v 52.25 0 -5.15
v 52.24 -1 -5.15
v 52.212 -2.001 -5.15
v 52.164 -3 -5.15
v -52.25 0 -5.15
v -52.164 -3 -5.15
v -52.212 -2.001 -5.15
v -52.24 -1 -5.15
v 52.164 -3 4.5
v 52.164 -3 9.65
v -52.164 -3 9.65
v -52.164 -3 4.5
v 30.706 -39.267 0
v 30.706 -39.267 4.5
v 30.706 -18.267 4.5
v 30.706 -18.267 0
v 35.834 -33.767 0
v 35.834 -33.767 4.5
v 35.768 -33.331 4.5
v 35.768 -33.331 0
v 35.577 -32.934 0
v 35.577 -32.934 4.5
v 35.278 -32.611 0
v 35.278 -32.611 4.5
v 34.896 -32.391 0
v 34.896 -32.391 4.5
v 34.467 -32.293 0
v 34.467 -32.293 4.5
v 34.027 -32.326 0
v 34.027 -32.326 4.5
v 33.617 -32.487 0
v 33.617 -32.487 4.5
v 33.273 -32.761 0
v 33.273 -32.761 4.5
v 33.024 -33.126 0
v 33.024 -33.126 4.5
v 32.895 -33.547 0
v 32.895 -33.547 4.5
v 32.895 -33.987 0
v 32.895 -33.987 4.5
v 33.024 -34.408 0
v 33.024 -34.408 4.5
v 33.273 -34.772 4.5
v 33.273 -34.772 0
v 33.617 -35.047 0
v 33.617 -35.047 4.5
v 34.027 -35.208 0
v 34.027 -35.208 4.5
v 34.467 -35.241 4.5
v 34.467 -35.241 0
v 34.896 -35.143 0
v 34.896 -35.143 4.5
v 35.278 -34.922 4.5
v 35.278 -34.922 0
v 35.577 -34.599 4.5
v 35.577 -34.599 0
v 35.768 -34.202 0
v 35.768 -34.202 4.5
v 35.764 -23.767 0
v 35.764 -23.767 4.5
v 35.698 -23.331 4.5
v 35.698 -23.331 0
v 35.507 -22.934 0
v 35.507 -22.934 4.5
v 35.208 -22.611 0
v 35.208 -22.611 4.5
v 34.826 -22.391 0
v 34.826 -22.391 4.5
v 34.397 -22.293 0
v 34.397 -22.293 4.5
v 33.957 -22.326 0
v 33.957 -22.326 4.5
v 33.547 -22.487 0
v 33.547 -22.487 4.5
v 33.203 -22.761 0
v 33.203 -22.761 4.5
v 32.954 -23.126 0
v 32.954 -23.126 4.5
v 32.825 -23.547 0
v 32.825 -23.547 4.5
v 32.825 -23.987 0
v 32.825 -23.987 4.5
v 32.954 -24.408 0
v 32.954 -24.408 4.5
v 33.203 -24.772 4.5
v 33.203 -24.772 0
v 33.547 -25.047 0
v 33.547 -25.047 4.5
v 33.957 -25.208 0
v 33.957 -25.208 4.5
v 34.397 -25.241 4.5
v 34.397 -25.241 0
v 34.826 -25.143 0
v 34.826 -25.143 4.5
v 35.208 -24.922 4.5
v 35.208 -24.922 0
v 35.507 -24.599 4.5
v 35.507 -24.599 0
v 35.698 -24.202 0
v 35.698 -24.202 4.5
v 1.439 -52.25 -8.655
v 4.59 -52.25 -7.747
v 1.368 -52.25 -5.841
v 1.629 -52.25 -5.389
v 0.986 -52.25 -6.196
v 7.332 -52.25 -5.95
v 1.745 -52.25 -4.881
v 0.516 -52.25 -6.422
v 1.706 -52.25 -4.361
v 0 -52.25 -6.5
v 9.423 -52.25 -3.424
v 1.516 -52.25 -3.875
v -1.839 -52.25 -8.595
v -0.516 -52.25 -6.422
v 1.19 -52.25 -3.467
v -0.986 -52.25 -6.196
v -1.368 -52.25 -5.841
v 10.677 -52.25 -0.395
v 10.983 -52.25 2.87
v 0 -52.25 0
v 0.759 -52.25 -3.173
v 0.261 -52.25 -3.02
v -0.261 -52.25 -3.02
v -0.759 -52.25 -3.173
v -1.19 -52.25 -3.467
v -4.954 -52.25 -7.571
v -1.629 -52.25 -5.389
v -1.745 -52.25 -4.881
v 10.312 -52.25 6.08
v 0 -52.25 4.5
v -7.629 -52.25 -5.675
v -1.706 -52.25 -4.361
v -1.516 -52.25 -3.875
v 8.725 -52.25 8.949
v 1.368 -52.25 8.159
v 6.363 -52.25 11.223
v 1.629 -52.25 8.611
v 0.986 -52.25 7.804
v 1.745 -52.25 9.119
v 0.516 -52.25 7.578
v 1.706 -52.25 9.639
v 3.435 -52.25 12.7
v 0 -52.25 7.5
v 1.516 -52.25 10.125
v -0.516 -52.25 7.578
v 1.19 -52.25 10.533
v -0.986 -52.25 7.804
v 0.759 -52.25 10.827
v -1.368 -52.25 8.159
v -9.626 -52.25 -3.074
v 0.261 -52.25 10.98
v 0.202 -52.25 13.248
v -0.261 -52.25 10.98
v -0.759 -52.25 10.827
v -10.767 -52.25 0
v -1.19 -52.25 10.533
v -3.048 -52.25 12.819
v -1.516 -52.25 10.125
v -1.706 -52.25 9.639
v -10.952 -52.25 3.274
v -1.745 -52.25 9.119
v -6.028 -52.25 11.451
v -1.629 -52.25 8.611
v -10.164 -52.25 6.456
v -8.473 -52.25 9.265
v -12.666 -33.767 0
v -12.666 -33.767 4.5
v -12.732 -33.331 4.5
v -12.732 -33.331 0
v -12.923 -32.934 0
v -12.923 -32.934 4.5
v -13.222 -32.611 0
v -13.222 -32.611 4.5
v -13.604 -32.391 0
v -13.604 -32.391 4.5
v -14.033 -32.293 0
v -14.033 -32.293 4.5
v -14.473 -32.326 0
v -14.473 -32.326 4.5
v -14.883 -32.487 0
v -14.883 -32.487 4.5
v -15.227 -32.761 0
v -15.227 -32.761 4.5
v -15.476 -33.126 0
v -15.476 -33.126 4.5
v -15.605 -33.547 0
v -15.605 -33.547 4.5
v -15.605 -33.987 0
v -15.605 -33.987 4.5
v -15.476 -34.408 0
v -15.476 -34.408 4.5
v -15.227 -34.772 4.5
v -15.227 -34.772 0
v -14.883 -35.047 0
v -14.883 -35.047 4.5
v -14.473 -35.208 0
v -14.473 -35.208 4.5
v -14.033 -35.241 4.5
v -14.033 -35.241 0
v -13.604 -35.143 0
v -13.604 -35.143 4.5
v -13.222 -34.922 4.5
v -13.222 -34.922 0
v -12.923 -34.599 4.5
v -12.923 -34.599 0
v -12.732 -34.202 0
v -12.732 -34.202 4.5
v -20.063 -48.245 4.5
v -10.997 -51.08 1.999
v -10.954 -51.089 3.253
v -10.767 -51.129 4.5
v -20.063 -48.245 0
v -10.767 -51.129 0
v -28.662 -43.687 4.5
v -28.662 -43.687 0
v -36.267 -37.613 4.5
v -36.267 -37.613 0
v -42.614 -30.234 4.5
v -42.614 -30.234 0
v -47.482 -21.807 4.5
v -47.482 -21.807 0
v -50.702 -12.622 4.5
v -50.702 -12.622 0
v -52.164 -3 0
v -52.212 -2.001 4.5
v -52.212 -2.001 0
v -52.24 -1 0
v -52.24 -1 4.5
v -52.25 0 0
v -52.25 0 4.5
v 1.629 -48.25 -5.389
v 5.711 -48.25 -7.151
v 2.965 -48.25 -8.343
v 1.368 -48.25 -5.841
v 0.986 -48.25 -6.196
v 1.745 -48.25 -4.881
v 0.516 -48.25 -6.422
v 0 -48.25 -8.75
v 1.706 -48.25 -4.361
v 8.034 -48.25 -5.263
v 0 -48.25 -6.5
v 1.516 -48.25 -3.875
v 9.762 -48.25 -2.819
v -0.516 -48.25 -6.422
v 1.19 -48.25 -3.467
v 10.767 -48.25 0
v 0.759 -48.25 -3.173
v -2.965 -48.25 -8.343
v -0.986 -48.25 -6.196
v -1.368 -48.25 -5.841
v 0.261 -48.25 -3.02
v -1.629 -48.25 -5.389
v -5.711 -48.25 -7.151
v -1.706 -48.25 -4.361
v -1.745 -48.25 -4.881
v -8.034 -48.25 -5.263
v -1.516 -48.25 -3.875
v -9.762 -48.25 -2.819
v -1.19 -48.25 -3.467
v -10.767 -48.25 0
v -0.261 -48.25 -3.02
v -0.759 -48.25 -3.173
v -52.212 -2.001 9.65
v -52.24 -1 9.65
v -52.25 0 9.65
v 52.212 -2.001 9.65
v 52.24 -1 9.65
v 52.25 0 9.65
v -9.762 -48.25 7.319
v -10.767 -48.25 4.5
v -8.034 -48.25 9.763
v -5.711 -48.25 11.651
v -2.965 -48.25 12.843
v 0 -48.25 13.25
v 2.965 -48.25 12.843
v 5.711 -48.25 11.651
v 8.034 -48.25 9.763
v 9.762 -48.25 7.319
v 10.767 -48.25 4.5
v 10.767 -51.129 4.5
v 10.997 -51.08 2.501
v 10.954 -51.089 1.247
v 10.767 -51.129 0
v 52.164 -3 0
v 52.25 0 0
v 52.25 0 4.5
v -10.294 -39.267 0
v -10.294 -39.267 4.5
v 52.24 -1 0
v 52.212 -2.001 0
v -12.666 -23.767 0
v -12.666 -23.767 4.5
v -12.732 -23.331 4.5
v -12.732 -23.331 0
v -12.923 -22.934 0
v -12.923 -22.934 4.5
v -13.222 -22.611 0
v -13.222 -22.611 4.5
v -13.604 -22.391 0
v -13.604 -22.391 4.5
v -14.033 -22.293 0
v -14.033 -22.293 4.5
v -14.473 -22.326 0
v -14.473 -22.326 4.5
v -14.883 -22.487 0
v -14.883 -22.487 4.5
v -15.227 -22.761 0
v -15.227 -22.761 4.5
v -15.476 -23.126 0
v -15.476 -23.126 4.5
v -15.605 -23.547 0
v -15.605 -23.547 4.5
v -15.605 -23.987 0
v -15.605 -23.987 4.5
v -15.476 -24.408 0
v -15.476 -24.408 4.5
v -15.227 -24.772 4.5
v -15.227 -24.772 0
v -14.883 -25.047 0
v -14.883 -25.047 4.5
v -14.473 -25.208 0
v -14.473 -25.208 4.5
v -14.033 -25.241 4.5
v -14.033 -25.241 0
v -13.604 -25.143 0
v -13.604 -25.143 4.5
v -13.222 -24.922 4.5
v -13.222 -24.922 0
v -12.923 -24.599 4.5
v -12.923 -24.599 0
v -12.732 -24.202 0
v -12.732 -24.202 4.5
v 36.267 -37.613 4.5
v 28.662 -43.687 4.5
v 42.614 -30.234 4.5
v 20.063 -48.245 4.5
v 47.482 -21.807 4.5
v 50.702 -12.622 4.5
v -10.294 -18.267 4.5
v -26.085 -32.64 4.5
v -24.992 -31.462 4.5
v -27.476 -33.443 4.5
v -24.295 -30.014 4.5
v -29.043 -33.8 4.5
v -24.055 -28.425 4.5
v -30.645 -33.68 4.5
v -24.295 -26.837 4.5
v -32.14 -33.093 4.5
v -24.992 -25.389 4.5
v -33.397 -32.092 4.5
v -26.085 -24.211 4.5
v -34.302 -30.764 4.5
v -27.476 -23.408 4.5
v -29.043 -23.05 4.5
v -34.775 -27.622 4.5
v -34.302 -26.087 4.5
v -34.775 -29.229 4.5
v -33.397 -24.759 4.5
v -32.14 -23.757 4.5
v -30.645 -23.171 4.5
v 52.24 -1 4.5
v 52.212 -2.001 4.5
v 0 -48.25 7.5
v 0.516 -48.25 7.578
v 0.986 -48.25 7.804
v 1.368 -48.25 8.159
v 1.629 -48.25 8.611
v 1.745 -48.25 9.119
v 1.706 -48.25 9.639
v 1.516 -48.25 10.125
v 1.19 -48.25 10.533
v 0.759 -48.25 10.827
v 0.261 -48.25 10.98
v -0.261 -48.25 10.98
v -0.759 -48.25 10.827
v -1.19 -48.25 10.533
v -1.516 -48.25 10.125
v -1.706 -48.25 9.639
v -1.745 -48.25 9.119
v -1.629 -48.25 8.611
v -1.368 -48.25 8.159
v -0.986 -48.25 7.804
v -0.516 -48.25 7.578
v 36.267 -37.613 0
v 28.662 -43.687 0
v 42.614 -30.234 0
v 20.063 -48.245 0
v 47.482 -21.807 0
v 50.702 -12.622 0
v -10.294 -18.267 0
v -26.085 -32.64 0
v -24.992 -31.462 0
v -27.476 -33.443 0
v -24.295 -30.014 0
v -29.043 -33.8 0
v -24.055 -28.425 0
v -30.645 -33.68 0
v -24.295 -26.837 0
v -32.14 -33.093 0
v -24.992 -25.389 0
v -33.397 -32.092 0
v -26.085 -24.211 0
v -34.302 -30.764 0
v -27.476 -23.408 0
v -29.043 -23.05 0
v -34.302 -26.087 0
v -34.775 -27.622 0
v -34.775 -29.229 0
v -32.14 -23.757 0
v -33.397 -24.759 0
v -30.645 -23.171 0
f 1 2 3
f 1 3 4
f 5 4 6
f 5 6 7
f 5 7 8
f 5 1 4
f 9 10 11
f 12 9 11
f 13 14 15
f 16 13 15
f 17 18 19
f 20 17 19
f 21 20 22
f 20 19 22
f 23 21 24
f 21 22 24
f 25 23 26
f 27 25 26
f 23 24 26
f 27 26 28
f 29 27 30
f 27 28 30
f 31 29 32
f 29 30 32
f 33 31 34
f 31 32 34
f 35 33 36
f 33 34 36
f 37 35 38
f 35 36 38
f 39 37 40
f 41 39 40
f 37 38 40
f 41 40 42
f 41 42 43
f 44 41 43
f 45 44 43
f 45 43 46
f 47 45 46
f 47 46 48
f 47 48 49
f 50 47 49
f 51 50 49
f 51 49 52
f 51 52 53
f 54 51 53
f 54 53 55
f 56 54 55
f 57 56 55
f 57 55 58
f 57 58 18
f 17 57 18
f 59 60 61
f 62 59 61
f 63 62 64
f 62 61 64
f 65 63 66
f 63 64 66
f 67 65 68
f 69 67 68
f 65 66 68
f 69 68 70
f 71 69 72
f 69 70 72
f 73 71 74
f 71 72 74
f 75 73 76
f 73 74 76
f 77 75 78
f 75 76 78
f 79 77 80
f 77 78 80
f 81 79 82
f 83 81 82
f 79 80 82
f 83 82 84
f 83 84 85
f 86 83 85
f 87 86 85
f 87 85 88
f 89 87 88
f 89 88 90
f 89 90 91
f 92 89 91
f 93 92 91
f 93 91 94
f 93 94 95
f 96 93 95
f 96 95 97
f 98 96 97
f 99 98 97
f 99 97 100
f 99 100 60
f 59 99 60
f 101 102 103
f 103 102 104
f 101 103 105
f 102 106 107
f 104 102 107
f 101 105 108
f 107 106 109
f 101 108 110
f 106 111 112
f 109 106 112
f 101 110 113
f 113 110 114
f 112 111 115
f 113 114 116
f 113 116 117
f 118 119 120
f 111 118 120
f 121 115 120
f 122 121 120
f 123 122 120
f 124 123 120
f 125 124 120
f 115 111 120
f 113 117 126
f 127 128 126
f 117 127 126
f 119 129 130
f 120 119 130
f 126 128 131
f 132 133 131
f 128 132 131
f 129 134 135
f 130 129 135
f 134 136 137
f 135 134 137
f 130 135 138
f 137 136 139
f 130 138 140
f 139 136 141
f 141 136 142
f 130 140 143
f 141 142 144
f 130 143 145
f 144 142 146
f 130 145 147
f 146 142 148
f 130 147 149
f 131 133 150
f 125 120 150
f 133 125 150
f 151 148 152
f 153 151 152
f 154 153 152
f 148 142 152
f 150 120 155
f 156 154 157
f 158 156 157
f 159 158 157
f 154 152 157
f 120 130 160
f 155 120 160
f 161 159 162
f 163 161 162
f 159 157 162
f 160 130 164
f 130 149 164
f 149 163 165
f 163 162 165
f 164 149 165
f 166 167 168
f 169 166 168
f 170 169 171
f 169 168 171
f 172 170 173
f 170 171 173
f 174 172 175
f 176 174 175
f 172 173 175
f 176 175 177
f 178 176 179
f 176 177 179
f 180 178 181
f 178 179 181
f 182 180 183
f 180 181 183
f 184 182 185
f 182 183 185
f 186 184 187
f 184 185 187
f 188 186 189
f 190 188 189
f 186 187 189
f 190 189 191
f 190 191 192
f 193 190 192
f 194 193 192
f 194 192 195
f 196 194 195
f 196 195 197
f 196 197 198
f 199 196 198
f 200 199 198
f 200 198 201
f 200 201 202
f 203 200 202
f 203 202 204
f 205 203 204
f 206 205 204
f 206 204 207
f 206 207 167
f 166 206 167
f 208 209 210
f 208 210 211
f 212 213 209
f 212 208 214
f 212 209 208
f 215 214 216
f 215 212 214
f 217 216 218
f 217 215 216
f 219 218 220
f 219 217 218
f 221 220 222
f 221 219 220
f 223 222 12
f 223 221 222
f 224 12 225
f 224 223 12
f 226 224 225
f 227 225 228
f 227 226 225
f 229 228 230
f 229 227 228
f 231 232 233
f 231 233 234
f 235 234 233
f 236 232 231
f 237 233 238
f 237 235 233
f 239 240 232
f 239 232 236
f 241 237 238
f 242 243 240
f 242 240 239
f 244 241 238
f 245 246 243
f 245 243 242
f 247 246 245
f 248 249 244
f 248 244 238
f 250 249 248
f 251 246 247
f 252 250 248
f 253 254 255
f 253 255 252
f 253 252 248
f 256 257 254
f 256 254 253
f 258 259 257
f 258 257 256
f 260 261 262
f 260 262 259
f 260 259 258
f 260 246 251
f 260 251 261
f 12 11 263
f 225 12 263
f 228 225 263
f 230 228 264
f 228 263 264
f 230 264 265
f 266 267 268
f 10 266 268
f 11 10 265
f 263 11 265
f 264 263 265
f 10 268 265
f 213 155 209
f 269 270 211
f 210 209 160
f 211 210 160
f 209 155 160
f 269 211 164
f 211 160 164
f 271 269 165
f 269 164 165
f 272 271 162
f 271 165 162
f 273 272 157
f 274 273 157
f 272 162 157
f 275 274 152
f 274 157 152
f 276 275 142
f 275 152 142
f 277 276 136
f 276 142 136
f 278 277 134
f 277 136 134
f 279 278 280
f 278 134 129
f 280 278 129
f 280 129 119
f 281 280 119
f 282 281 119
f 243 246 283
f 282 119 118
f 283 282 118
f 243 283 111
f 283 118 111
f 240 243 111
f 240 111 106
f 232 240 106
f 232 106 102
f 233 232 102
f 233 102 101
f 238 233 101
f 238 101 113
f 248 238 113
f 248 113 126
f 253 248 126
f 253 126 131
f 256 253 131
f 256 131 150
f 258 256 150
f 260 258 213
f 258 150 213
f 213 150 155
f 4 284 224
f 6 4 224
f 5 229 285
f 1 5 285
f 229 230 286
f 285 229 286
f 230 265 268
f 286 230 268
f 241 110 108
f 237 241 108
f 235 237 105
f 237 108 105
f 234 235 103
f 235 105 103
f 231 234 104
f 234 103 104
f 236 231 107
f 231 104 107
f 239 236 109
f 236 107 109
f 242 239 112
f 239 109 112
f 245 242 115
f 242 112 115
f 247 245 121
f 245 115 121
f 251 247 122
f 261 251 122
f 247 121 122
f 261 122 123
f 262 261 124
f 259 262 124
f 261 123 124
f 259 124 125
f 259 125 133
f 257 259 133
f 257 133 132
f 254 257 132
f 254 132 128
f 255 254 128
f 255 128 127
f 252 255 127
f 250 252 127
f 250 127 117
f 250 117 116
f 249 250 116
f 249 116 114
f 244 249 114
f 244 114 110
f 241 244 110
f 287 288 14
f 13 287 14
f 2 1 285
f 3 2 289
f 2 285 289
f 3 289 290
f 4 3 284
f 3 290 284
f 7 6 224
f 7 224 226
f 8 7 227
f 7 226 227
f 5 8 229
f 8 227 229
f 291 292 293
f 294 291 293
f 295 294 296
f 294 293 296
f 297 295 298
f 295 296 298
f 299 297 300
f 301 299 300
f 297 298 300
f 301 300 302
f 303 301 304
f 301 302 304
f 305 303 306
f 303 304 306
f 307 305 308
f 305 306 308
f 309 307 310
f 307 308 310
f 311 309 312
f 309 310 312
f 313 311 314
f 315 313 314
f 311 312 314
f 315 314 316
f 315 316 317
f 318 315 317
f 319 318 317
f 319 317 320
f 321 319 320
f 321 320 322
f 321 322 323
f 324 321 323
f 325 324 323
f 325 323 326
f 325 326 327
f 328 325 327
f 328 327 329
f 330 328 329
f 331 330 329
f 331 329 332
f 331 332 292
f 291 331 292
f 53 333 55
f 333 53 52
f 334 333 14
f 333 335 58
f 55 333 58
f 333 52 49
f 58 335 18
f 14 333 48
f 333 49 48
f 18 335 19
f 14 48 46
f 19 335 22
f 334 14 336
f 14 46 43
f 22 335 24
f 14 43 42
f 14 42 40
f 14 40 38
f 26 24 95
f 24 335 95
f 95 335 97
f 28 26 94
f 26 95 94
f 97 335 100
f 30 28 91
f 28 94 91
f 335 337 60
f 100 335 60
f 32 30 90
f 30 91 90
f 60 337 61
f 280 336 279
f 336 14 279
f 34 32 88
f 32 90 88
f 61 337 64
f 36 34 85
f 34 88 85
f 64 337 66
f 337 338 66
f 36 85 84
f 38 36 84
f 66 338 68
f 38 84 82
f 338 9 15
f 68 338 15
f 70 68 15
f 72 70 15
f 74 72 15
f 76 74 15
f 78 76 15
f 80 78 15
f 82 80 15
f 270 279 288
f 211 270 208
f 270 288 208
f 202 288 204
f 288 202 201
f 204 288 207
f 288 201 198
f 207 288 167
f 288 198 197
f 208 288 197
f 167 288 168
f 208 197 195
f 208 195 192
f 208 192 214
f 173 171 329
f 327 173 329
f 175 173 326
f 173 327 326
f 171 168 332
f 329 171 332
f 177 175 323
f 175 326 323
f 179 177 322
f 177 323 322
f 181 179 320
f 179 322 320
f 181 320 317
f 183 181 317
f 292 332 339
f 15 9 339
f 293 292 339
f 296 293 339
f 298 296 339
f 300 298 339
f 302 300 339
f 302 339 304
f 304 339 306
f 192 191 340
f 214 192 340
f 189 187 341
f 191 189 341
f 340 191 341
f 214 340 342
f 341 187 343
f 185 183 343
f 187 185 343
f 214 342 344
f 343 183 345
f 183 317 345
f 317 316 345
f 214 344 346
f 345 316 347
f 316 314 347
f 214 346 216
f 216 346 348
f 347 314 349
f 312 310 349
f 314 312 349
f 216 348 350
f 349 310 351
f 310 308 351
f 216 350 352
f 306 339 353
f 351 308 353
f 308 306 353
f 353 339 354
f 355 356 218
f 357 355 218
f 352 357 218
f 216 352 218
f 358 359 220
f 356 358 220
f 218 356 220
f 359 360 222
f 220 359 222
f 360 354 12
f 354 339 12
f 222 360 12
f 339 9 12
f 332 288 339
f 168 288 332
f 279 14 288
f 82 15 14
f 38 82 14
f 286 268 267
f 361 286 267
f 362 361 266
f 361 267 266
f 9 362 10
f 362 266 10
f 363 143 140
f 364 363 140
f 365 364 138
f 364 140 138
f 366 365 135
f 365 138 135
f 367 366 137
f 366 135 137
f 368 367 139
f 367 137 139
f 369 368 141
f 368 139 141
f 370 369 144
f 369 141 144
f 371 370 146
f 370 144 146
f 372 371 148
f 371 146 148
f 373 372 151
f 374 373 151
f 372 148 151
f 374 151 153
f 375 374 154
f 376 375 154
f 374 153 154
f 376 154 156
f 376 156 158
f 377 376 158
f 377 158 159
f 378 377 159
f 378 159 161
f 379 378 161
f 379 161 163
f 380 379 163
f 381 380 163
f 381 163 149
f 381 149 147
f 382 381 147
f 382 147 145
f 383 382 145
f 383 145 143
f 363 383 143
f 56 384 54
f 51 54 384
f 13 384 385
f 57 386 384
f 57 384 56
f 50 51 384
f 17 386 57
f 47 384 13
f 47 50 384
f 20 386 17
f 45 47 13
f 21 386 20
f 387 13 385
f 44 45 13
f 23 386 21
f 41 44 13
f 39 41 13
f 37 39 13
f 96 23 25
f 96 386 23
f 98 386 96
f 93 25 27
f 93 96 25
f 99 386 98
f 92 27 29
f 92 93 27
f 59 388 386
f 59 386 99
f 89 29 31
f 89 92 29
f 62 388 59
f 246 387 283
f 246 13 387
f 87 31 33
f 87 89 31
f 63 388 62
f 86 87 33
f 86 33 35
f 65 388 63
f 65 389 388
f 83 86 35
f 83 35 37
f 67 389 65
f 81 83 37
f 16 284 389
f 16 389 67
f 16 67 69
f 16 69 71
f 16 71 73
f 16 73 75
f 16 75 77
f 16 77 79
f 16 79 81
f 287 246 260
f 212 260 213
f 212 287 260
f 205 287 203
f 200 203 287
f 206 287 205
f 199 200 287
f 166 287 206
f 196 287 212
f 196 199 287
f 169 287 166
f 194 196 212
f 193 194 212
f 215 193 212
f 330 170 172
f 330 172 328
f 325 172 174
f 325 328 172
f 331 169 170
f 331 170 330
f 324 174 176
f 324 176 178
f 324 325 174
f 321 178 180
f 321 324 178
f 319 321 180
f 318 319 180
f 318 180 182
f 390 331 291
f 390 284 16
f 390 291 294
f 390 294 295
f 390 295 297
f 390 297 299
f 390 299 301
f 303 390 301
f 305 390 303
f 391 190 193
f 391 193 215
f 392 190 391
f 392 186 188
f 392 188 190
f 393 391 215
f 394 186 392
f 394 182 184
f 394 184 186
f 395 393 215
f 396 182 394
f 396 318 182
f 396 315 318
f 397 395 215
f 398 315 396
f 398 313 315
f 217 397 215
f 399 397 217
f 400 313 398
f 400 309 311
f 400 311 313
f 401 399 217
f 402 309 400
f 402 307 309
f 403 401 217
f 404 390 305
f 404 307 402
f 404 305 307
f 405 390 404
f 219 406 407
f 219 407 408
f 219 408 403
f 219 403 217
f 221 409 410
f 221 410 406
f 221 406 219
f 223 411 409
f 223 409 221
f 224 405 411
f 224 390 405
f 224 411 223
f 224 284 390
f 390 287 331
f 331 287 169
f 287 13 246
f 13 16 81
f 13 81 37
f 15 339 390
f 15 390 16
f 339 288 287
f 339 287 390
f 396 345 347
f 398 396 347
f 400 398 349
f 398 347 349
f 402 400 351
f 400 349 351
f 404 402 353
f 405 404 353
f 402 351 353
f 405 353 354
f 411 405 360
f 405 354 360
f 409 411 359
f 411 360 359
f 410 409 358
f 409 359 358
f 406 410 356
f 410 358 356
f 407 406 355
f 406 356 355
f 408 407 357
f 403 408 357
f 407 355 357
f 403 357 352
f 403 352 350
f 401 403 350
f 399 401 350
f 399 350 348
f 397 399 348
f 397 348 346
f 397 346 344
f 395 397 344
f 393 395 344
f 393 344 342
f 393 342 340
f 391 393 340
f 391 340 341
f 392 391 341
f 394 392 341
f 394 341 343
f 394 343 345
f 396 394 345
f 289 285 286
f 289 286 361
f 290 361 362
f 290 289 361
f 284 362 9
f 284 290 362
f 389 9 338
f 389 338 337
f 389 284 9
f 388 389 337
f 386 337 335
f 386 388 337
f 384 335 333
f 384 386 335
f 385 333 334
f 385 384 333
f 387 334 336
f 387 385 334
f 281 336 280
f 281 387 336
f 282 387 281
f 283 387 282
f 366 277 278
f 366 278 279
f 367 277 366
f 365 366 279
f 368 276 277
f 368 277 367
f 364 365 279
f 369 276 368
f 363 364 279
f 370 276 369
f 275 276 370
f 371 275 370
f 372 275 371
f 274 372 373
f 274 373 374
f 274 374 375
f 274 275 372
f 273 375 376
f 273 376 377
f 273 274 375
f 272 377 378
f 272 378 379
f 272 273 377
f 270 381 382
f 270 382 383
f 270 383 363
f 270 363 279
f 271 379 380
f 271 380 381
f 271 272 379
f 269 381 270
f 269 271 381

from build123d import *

# Parameters (mm, degrees)
EXTRUDE_1_DEPTH     = 4.5
EXTRUDE_2_DEPTH     = 7.4
SKETCH_3_R          = 11
EXTRUDE_3_DEPTH     = 4
CUT_EXTRUDE_2_REACH = 77.071
SKETCH_7_R          = 1.75
SKETCH_10_R         = 1.478021834
SKETCH_10_W         = 41
SKETCH_10_H         = 21
CUT_EXTRUDE_3_DEPTH = 14
SKETCH_12_R         = 5.390059672
CUT_EXTRUDE_4_DEPTH = 15


with BuildPart() as part:
    # 草图1 → 凸台-拉伸1 (new body)
    with BuildSketch(Plane.XY):
        with BuildLine():
            Line((-52.25, 0), (52.25, 0))
            ThreePointArc((52.25, 0), (0, -52.25), (-52.25, 0))
        make_face()
    extrude(amount=EXTRUDE_1_DEPTH)

    # 草图2 → 凸台-拉伸2 (add, symmetric)
    with BuildSketch(Plane.XY.offset(2.25)):
        with BuildLine():
            Line((-52.25, 0), (52.25, 0))
            ThreePointArc((52.25, 0), (52.22844668, -1.500619011), (52.163804501, -3))
            Line((52.163804501, -3), (-52.163804501, -3))
            ThreePointArc((-52.163804501, -3), (-52.22844668, -1.500619011), (-52.25, 0))
        make_face()
    extrude(amount=EXTRUDE_2_DEPTH, both=True)

    # 草图3 → 凸台-拉伸3 (add)
    with BuildSketch(Plane(origin=(0, -52.25, 0), x_dir=(1, 0, 0), z_dir=(0, 1, 0))):
        with Locations(Location((0, -2.25, 0), (0, 0, 168.19710831))):
            Circle(SKETCH_3_R)
    extrude(amount=EXTRUDE_3_DEPTH)

    # 草图7 → 切除-拉伸2 (cut, up to next)
    with BuildSketch(Plane.XZ.offset(52.25), mode=Mode.PRIVATE) as cut_extrude_2_sk1:
        with Locations(Location((0, 9.25, 0), (0, 0, 270))):
            Circle(SKETCH_7_R)
    cut_extrude_2_tool1 = extrude(cut_extrude_2_sk1.sketch, amount=-CUT_EXTRUDE_2_REACH, mode=Mode.PRIVATE) & part.part
    # 草图7 → 切除-拉伸2 (cut, up to next)
    with BuildSketch(Plane.XZ.offset(52.25), mode=Mode.PRIVATE) as cut_extrude_2_sk2:
        with Locations(Location((0, -4.75, 0), (0, 0, 270))):
            Circle(SKETCH_7_R)
    cut_extrude_2_tool2 = extrude(cut_extrude_2_sk2.sketch, amount=-CUT_EXTRUDE_2_REACH, mode=Mode.PRIVATE) & part.part
    add(cut_extrude_2_tool1.solids().sort_by_distance((0, -52.25, 9.25))[0], mode=Mode.SUBTRACT)
    add(cut_extrude_2_tool2.solids().sort_by_distance((0, -52.25, -4.75))[0], mode=Mode.SUBTRACT)

    # 草图10 → 切除-拉伸3 (cut)
    with BuildSketch(Plane.XY.offset(4.5)):
        with Locations((-14.143943937, -23.76680221)):
            Circle(SKETCH_10_R)
        with Locations((34.286056063, -23.76680221)):
            Circle(SKETCH_10_R)
        with Locations((-14.143943937, -33.76680221)):
            Circle(SKETCH_10_R)
        with Locations((34.356056063, -33.76680221)):
            Circle(SKETCH_10_R)
        with Locations((10.206056063, -28.76680221)):
            Rectangle(SKETCH_10_W, SKETCH_10_H)
    extrude(amount=-CUT_EXTRUDE_3_DEPTH, mode=Mode.SUBTRACT)

    # 草图12 → 切除-拉伸4 (cut)
    with BuildSketch(Plane.XY.offset(4.5)):
        with Locations((-29.445394051, -28.42542141)):
            Circle(SKETCH_12_R)
    extrude(amount=-CUT_EXTRUDE_4_DEPTH, mode=Mode.SUBTRACT)


solid = part.part
